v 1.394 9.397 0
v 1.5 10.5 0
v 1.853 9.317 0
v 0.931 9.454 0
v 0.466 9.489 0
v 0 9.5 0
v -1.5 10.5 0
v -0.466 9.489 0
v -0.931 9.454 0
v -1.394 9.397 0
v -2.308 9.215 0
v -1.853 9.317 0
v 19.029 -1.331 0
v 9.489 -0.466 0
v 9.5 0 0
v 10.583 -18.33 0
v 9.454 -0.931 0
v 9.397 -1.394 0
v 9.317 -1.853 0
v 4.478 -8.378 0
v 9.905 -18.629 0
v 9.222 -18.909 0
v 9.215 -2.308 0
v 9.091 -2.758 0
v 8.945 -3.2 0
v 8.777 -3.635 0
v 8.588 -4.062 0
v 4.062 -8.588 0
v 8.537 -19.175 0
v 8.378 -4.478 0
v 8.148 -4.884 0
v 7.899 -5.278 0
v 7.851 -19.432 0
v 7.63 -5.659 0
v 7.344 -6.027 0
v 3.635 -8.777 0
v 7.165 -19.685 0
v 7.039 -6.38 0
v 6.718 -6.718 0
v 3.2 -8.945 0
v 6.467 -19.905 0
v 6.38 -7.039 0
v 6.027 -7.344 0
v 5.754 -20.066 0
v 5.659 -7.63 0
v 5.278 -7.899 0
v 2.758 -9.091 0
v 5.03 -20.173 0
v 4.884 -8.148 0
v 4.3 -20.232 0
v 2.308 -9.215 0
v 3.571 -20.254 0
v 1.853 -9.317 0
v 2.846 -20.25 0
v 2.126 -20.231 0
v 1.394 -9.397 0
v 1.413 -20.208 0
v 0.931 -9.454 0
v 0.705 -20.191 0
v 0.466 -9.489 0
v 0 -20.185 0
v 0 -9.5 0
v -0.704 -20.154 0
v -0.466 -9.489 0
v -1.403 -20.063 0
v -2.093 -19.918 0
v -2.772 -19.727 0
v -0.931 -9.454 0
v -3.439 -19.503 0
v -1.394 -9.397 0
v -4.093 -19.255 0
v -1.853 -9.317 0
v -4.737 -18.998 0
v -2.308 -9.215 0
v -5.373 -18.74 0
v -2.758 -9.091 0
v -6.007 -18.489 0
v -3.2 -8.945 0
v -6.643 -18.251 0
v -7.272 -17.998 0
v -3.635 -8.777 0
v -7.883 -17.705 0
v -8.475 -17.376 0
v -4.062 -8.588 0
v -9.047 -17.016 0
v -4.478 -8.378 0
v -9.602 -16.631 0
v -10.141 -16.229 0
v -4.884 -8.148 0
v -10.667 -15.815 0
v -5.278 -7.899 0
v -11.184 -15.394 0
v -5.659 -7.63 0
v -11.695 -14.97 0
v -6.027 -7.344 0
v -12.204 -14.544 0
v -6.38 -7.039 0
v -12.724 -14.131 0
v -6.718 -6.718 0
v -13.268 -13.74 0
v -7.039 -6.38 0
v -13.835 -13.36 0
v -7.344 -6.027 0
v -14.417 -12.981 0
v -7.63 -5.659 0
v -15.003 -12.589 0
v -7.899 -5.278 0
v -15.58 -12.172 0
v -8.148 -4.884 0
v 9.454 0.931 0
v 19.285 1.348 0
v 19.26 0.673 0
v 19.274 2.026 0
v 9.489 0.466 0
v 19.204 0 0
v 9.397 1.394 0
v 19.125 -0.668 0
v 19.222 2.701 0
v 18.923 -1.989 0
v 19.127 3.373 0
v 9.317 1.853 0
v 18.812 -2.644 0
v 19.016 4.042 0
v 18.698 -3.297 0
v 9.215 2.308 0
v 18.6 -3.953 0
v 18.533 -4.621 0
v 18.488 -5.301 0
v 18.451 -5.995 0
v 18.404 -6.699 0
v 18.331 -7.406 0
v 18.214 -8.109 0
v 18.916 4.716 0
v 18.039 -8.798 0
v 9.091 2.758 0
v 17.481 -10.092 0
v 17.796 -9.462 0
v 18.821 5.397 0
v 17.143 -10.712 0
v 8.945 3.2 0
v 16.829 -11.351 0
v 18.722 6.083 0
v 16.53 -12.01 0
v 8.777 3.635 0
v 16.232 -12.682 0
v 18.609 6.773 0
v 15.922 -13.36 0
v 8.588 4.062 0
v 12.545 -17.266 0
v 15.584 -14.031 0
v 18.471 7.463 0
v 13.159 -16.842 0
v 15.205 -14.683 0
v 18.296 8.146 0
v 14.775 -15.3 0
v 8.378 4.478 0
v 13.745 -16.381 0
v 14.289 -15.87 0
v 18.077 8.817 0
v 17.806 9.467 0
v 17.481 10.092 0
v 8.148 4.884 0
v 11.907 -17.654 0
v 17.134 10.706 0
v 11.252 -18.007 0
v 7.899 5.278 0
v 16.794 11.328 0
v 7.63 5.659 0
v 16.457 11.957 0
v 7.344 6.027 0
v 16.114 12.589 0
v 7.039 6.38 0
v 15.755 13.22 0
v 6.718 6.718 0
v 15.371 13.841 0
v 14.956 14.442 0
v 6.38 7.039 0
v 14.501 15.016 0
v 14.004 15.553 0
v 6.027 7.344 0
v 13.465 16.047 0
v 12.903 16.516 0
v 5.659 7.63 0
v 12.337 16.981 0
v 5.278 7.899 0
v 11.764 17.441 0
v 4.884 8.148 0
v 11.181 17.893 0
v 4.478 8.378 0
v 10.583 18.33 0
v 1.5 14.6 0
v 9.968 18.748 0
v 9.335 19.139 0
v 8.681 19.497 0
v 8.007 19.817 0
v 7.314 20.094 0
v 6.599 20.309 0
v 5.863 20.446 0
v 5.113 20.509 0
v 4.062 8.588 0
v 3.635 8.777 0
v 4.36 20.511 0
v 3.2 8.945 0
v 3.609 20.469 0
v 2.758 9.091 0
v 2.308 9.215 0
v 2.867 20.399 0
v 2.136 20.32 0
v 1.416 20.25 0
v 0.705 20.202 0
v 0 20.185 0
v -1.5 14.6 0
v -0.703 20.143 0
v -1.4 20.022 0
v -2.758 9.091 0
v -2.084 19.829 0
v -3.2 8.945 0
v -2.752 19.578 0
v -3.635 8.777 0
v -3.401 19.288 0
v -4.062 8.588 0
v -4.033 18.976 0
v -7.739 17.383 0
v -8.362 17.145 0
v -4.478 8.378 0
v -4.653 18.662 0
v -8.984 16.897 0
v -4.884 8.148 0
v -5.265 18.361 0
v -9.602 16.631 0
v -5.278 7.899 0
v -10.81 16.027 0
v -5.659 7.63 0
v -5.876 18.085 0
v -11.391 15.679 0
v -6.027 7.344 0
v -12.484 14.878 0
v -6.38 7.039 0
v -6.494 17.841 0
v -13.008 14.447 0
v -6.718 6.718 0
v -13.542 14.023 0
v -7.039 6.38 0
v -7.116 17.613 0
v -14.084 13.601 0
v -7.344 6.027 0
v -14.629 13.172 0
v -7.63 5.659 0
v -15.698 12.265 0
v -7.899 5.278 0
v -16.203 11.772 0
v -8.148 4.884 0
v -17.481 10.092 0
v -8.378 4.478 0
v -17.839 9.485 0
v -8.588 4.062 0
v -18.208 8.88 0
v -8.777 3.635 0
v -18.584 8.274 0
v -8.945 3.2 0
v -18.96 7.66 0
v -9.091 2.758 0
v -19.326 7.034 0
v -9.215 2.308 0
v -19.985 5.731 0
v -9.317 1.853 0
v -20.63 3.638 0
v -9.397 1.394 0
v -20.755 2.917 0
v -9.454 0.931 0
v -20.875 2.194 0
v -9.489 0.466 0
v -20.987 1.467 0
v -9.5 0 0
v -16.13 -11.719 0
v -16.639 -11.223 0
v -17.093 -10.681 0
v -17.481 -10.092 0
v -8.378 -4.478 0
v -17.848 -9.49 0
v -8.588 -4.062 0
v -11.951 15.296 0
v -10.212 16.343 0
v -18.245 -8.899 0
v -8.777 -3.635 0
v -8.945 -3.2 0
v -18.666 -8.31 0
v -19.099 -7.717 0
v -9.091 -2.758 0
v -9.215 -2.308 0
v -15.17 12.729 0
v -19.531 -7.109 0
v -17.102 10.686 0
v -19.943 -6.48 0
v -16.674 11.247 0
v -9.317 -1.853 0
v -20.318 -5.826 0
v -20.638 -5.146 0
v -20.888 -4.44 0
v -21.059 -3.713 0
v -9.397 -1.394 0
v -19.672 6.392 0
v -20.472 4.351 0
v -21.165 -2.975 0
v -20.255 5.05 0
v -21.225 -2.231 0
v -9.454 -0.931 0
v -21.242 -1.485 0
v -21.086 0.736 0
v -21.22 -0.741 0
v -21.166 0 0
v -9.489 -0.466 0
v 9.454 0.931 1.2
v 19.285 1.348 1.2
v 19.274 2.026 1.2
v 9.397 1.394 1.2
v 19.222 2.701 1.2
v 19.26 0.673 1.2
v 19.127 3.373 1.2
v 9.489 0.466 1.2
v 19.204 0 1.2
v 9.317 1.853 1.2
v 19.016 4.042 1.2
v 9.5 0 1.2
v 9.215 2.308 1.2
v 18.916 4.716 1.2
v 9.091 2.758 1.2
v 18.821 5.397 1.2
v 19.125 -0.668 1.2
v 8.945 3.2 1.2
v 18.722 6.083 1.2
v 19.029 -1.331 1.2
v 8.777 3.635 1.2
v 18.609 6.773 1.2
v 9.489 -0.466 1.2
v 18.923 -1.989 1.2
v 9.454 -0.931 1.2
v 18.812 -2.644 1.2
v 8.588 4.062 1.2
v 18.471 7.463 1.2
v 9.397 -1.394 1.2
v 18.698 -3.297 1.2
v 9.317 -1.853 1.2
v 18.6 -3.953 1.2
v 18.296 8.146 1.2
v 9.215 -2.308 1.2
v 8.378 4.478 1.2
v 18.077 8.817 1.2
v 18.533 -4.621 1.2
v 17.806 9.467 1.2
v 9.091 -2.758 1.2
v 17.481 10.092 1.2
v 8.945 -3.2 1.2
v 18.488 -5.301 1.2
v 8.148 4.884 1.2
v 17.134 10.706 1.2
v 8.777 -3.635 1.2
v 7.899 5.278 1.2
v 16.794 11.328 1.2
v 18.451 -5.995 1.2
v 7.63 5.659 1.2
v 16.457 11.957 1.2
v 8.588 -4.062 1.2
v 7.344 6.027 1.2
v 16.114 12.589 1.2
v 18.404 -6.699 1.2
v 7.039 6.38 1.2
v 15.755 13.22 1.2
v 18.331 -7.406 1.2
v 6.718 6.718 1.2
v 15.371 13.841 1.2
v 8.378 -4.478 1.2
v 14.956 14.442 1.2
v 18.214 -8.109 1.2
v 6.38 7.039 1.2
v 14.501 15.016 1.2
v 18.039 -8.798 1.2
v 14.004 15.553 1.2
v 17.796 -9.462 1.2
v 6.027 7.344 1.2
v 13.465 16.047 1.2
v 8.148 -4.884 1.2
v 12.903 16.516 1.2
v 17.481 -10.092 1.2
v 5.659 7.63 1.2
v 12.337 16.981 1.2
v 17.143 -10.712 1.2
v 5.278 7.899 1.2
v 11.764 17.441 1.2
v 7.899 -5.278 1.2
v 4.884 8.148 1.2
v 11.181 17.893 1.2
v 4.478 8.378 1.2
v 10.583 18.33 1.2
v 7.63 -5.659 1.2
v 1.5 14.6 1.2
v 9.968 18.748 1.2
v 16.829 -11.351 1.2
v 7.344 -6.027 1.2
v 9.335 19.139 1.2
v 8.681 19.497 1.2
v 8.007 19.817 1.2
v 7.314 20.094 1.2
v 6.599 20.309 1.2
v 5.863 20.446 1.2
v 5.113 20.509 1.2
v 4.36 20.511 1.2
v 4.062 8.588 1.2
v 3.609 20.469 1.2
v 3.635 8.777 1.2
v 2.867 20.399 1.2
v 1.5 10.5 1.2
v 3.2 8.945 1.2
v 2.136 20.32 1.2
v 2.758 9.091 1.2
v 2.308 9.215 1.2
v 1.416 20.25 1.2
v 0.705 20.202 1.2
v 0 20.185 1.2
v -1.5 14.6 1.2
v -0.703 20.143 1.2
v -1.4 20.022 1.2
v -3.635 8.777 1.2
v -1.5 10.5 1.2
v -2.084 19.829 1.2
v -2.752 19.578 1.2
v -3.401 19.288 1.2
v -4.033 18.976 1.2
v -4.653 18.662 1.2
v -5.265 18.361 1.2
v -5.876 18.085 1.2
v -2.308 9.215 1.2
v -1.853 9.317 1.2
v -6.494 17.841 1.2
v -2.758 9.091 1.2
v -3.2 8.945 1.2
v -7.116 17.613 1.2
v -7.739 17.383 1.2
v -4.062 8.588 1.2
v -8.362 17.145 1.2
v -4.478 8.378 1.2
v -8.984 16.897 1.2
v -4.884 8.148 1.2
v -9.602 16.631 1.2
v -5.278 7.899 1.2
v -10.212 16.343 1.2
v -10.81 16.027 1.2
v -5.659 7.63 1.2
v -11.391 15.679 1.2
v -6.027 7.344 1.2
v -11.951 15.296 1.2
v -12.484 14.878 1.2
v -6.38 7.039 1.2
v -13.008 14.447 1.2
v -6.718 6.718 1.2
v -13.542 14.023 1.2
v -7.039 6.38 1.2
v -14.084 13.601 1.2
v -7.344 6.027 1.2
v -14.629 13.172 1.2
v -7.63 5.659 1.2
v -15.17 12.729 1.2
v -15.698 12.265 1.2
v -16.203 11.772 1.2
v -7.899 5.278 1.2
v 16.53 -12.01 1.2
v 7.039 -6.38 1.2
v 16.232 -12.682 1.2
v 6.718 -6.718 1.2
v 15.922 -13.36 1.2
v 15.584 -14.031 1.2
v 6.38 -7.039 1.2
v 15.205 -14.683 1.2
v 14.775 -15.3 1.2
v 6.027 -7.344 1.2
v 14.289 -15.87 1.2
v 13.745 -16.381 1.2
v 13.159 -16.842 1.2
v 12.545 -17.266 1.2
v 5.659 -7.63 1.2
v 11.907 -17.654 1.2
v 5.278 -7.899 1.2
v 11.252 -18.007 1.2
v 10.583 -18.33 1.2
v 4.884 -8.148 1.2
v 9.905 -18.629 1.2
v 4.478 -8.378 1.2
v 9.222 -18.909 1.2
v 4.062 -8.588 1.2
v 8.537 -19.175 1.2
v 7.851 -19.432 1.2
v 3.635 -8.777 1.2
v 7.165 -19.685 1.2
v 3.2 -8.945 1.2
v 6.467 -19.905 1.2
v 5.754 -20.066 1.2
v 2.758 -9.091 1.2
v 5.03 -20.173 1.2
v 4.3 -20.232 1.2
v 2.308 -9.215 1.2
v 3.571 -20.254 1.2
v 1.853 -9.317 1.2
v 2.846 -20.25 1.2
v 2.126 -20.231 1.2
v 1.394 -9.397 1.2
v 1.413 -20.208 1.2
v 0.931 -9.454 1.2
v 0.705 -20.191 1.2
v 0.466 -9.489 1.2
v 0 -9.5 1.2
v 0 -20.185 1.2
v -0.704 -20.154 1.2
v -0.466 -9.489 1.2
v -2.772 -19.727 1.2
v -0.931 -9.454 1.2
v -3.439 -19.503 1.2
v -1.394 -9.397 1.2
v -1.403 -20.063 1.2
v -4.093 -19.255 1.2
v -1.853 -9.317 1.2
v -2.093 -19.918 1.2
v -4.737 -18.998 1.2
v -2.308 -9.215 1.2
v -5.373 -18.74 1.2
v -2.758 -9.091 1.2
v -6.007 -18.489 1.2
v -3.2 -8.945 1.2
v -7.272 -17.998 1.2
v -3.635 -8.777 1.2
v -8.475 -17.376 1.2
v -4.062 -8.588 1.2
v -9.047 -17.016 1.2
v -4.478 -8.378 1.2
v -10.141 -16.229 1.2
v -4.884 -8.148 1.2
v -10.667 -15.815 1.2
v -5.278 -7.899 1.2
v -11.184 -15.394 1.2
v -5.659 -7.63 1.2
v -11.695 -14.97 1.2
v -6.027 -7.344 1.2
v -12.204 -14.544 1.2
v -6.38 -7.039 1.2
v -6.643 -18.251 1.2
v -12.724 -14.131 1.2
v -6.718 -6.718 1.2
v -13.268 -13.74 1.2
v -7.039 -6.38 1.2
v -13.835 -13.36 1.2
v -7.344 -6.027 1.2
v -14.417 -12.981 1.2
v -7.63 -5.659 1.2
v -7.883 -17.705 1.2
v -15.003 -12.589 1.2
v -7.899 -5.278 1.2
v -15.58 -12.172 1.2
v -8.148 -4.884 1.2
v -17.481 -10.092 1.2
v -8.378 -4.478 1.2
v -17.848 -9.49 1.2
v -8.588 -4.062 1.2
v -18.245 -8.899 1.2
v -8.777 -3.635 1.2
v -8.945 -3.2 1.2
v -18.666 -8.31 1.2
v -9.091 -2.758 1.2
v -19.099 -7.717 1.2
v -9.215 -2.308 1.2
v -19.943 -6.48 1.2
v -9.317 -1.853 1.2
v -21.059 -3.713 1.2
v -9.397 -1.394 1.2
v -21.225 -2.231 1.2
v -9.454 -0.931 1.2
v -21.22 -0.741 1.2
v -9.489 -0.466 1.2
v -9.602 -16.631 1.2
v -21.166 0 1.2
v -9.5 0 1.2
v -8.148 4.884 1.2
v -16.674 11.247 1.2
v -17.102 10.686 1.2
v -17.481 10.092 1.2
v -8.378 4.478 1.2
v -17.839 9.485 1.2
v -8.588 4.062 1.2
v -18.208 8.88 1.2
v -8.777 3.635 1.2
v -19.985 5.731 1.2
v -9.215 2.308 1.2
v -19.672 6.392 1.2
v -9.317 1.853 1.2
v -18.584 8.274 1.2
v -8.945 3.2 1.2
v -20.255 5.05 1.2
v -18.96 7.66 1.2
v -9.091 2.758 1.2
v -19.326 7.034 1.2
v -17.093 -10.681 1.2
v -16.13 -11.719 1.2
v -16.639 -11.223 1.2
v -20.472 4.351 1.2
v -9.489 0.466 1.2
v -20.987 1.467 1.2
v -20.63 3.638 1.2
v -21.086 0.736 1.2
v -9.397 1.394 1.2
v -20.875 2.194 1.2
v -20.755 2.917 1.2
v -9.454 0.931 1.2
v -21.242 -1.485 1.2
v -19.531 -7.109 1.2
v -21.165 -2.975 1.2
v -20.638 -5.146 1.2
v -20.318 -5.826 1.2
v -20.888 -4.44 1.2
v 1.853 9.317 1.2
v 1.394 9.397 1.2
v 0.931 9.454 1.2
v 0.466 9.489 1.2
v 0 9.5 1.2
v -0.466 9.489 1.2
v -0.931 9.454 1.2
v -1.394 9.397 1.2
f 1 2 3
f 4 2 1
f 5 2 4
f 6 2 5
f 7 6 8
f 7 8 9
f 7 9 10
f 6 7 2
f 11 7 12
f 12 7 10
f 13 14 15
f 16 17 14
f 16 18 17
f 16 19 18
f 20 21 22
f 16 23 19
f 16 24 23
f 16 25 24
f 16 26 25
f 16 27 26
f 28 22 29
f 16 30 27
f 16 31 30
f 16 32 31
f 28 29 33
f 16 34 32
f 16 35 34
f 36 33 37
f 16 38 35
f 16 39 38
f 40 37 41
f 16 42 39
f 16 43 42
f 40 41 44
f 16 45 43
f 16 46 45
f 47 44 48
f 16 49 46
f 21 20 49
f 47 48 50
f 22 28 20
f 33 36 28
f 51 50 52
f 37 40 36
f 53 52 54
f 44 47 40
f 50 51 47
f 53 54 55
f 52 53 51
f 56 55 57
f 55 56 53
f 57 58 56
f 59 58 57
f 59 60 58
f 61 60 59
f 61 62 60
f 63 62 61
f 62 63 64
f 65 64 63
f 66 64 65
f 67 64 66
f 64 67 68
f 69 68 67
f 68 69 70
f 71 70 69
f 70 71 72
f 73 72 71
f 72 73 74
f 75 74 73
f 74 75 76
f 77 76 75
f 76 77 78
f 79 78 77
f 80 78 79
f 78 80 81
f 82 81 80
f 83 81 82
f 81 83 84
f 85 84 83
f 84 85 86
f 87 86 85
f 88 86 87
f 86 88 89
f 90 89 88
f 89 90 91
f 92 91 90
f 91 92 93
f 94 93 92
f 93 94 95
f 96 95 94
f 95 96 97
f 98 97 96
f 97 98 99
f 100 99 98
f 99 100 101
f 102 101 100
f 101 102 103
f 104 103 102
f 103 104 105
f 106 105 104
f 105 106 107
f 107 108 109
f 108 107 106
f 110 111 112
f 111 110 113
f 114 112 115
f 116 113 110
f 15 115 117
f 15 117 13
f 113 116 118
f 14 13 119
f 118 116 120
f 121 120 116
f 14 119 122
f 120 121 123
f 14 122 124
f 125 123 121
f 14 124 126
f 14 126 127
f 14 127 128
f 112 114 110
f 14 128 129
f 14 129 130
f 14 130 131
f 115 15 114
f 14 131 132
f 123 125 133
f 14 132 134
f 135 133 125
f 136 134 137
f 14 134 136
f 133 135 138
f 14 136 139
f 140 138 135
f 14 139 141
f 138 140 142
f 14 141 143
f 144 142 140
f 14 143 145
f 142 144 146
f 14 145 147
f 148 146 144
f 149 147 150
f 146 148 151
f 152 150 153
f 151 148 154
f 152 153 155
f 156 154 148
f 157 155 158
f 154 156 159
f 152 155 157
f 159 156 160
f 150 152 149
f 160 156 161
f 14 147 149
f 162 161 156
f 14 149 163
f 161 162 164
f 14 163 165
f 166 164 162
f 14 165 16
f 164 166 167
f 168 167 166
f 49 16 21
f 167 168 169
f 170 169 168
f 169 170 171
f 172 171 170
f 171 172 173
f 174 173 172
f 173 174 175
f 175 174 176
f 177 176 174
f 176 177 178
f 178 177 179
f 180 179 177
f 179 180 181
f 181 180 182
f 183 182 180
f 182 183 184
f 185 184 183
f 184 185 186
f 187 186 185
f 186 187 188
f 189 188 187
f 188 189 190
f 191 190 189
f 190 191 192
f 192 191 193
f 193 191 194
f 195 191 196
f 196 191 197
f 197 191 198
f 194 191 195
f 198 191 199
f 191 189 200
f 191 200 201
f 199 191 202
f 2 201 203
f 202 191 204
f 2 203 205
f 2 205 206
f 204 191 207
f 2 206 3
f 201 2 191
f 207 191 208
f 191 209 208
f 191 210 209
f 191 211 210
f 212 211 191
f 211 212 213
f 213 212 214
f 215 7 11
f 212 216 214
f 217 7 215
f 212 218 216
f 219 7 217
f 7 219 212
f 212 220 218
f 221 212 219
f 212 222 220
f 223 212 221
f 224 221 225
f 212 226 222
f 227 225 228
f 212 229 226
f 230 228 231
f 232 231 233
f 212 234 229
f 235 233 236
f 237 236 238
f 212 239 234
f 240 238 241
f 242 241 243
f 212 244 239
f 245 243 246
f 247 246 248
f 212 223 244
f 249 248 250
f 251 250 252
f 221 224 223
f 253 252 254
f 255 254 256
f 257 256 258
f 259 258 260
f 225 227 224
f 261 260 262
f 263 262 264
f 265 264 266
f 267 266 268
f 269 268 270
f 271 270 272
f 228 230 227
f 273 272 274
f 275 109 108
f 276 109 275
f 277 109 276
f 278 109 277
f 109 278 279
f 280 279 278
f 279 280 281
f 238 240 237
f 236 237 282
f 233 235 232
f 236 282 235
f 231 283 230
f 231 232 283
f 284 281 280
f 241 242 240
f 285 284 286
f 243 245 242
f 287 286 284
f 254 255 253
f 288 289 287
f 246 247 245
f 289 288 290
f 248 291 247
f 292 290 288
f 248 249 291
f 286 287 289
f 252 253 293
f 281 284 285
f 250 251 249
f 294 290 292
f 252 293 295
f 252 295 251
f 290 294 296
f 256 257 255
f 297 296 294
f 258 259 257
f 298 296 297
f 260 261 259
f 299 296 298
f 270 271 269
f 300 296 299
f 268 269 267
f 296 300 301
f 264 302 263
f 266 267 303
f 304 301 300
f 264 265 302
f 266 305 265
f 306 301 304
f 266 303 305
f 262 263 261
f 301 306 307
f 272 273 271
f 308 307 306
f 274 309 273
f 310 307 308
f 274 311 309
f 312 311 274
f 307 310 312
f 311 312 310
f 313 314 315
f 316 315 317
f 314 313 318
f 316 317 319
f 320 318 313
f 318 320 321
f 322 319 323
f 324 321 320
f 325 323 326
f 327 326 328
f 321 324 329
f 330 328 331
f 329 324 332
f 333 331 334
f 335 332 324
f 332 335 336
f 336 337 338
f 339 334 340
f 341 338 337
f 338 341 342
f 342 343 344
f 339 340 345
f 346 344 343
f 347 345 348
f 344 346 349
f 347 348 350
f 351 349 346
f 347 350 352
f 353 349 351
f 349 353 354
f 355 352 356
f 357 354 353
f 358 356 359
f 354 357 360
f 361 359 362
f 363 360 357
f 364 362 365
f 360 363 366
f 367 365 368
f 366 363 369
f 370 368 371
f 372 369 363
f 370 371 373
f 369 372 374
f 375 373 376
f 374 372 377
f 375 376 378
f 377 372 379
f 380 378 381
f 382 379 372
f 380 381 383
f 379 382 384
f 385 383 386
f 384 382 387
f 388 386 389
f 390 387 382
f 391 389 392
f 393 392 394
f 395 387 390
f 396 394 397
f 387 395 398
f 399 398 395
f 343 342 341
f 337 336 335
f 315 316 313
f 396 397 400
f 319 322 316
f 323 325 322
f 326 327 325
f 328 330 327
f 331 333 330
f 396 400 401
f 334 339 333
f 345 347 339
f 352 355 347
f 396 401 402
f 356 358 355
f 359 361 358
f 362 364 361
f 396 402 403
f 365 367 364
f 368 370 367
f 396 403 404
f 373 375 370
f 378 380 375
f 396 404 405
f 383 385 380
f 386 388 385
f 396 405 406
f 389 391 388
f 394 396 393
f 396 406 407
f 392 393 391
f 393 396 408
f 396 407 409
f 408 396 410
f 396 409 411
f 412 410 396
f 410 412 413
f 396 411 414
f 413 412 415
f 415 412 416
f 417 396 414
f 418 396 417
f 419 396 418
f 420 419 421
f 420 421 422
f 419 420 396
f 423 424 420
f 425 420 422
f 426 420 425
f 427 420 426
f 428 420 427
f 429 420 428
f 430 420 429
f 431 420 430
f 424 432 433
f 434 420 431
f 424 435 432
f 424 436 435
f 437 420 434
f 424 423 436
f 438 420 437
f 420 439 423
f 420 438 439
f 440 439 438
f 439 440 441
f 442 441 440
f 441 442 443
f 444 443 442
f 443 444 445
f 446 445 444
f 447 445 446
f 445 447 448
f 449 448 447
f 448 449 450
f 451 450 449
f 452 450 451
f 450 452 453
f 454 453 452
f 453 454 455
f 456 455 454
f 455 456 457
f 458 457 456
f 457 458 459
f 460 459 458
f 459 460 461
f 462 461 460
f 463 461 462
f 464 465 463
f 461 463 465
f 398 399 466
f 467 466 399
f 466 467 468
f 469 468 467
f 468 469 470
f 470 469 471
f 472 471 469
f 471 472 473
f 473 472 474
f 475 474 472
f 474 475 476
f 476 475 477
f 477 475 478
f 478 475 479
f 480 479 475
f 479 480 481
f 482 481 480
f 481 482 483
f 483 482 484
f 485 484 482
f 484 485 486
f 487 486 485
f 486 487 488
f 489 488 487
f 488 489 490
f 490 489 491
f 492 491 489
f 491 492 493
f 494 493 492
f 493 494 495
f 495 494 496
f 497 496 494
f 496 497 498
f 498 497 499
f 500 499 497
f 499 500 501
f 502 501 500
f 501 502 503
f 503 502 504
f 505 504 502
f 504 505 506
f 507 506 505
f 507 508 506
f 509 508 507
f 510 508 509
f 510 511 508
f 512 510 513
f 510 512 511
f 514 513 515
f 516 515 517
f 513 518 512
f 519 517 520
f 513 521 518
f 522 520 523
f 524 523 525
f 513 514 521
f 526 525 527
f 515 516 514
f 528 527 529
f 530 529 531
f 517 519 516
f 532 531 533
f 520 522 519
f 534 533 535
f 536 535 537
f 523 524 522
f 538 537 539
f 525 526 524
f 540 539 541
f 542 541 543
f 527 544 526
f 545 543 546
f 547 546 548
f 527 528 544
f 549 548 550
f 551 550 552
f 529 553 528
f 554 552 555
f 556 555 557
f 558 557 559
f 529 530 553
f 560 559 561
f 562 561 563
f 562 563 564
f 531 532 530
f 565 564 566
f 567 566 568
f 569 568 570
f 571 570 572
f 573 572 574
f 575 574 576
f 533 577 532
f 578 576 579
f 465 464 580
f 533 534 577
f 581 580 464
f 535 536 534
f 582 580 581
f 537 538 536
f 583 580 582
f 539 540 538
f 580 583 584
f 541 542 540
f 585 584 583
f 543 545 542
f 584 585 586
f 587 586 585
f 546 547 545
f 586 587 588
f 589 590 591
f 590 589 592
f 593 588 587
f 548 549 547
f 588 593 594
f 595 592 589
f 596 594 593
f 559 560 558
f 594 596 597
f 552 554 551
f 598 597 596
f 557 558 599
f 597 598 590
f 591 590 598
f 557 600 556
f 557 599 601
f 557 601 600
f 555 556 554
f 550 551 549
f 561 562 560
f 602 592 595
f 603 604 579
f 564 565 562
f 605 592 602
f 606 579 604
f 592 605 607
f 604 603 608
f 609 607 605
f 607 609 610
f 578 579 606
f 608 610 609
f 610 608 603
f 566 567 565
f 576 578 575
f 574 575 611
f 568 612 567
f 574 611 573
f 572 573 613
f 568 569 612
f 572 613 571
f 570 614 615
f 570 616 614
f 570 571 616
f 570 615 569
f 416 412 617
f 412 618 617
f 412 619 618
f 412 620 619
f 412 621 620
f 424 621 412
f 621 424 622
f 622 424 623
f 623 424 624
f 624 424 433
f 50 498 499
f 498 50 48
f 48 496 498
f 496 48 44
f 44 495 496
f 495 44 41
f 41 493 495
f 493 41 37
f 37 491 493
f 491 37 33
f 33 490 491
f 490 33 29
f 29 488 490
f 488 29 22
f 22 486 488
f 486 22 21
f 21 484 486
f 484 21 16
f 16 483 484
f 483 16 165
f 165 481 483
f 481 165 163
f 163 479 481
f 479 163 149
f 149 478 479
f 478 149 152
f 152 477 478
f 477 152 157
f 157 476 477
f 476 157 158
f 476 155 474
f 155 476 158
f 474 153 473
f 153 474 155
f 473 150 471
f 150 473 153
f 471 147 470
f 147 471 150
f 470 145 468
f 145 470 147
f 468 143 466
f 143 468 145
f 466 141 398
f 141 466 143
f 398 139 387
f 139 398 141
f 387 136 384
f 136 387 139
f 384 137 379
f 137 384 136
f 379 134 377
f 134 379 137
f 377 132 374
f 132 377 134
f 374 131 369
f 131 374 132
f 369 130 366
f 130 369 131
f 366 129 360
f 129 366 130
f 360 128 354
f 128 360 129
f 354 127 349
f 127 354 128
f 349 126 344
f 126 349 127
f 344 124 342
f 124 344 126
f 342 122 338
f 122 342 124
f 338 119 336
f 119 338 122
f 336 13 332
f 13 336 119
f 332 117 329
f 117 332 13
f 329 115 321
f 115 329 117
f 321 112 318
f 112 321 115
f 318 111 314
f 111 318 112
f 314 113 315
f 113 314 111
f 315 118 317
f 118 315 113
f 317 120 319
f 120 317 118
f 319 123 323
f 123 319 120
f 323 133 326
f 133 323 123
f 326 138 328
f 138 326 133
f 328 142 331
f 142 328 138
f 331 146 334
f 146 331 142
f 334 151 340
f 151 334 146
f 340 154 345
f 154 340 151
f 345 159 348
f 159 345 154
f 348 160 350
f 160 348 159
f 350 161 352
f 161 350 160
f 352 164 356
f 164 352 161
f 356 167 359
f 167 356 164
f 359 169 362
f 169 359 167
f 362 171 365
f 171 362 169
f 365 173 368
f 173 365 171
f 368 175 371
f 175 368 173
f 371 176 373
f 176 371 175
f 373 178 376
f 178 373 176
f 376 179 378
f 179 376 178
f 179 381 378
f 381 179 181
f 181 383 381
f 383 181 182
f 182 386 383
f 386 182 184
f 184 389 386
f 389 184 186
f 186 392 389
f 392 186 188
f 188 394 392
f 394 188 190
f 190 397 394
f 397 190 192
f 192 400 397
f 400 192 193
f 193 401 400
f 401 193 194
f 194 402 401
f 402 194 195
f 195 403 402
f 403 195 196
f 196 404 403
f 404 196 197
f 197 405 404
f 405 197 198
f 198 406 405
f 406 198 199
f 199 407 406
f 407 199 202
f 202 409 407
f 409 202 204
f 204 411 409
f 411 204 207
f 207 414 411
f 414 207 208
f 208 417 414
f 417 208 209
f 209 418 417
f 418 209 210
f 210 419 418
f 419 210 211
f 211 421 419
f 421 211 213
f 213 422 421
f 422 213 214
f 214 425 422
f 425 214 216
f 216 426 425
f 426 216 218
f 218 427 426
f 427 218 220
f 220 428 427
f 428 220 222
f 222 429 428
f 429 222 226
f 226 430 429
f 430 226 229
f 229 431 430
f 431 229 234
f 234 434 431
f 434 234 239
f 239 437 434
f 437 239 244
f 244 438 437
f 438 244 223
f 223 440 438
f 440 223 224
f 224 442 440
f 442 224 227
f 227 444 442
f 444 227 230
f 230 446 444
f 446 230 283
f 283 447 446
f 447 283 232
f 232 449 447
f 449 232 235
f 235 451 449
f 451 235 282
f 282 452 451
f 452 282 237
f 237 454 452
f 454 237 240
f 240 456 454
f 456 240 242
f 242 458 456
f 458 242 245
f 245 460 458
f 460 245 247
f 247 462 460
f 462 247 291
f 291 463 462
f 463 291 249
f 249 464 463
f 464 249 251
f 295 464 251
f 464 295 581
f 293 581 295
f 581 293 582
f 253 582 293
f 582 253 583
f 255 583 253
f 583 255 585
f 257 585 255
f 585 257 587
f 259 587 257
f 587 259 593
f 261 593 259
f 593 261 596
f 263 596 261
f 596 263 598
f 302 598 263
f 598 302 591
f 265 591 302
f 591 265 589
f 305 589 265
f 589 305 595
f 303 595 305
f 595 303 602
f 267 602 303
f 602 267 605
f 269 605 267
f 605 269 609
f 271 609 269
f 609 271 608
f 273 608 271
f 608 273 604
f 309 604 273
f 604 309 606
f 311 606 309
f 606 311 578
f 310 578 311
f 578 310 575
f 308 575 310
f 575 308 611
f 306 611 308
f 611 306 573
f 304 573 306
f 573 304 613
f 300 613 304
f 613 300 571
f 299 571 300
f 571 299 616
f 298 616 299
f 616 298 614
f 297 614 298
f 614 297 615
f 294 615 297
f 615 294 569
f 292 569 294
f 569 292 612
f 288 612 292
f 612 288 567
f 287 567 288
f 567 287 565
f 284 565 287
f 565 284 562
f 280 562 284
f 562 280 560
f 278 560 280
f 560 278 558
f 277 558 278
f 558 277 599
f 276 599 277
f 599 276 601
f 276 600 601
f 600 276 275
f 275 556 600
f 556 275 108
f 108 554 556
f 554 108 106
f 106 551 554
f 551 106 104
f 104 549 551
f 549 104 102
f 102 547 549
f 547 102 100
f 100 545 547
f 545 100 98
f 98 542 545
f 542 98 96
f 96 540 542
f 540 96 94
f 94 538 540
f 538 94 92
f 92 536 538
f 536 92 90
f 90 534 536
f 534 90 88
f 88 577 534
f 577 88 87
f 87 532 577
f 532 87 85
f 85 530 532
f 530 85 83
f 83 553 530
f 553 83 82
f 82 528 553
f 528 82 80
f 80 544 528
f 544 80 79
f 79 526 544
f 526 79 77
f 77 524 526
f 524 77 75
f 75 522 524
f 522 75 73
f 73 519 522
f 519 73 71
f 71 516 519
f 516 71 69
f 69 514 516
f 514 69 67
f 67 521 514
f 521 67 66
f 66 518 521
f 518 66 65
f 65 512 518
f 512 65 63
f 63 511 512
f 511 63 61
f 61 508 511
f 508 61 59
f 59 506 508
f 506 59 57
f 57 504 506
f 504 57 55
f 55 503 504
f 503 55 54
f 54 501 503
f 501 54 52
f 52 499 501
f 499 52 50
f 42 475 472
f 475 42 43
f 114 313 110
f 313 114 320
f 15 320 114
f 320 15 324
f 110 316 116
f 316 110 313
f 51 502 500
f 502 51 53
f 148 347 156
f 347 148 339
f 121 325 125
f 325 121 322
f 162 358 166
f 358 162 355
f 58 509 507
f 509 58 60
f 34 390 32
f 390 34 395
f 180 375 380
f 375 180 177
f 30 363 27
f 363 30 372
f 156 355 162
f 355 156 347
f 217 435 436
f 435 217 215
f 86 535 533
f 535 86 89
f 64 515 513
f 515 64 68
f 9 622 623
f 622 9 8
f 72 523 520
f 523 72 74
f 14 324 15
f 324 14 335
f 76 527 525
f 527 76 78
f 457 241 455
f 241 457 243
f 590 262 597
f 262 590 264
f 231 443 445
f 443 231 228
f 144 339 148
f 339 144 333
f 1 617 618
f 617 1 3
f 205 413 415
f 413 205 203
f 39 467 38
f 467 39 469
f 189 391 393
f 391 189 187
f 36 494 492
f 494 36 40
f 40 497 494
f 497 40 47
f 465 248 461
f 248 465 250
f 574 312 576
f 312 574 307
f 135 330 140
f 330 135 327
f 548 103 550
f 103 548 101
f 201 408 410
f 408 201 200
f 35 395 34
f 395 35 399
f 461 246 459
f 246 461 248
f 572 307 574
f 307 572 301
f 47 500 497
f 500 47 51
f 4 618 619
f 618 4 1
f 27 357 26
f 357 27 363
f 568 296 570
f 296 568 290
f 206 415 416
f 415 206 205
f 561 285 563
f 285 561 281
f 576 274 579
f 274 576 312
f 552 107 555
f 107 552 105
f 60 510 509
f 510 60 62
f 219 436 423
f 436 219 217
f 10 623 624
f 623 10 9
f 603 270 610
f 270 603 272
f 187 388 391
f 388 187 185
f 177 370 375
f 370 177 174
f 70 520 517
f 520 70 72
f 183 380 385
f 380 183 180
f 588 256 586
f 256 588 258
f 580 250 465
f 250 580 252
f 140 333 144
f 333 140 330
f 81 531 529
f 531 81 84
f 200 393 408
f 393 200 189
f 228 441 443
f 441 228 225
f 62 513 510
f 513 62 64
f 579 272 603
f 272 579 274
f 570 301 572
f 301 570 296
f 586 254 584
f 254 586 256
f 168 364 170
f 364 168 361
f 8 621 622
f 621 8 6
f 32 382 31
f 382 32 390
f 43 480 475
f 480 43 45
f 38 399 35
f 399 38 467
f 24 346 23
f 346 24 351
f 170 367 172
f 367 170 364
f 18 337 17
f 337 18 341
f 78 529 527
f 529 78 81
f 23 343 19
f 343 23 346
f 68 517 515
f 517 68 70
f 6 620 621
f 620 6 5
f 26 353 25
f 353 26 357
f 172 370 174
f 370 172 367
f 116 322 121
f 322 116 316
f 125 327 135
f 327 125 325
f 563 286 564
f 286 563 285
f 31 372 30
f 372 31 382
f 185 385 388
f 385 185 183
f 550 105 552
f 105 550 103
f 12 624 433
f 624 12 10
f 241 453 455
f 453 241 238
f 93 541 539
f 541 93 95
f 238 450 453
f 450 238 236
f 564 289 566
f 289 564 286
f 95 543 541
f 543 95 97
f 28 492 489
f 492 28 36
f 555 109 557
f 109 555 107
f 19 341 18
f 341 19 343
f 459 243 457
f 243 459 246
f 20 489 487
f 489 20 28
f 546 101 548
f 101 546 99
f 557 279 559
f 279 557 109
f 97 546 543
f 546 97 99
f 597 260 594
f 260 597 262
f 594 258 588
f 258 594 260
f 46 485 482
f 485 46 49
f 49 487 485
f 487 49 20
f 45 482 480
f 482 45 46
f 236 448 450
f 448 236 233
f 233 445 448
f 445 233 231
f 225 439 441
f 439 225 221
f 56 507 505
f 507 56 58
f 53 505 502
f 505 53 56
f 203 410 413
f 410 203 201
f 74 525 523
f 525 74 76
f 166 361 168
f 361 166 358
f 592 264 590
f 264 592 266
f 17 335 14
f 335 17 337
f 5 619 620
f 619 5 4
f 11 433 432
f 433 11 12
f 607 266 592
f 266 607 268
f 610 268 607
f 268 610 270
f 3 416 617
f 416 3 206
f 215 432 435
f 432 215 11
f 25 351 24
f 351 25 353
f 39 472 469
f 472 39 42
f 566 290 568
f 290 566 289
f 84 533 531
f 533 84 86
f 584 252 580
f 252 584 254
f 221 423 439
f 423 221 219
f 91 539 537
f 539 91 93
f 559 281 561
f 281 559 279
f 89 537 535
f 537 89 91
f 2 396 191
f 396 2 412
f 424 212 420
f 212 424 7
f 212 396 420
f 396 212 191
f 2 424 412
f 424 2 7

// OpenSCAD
/*
  Elna Supermatic cam 22
  Name: Small lobes
  Status: candidate

  Generated from measured parametric base v2.
  Surface mode: smooth
*/

include <_elna_measured_common.scad>;

profile_points = [
        [0.0000, 20.1850],
        [0.7055, 20.2020],
        [1.4160, 20.2500],
        [2.1357, 20.3202],
        [2.8669, 20.3988],
        [3.6092, 20.4687],
        [4.3599, 20.5115],
        [5.1135, 20.5090],
        [5.8627, 20.4456],
        [6.5990, 20.3095],
        [7.3138, 20.0944],
        [8.0066, 19.8170],
        [8.6807, 19.4972],
        [9.3347, 19.1390],
        [9.9685, 18.7479],
        [10.5830, 18.3303],
        [11.1806, 17.8927],
        [11.7642, 17.4412],
        [12.3374, 16.9810],
        [12.9034, 16.5157],
        [13.4651, 16.0471],
        [14.0045, 15.5535],
        [14.5011, 15.0163],
        [14.9556, 14.4425],
        [15.3715, 13.8406],
        [15.7549, 13.2199],
        [16.1137, 12.5894],
        [16.4572, 11.9569],
        [16.7945, 11.3281],
        [17.1337, 10.7063],
        [17.4807, 10.0925],
        [17.8058, 9.4675],
        [18.0767, 8.8166],
        [18.2963, 8.1460],
        [18.4708, 7.4627],
        [18.6092, 6.7732],
        [18.7221, 6.0832],
        [18.8208, 5.3968],
        [18.9158, 4.7162],
        [19.0158, 4.0419],
        [19.1269, 3.3726],
        [19.2224, 2.7015],
        [19.2742, 2.0258],
        [19.2850, 1.3485],
        [19.2596, 0.6726],
        [19.2040, 0.0000],
        [19.1250, -0.6679],
        [19.0294, -1.3307],
        [18.9234, -1.9889],
        [18.8118, -2.6438],
        [18.6976, -3.2969],
        [18.5998, -3.9535],
        [18.5331, -4.6208],
        [18.4881, -5.3014],
        [18.4507, -5.9950],
        [18.4043, -6.6986],
        [18.3311, -7.4063],
        [18.2142, -8.1095],
        [18.0393, -8.7983],
        [17.7964, -9.4625],
        [17.4807, -10.0925],
        [17.1427, -10.7120],
        [16.8290, -11.3513],
        [16.5299, -12.0097],
        [16.2324, -12.6822],
        [15.9219, -13.3600],
        [15.5836, -14.0315],
        [15.2046, -14.6829],
        [14.7750, -15.3000],
        [14.2891, -15.8696],
        [13.7454, -16.3811],
        [13.1587, -16.8424],
        [12.5447, -17.2663],
        [11.9075, -17.6536],
        [11.2520, -18.0069],
        [10.5830, -18.3303],
        [9.9052, -18.6290],
        [9.2224, -18.9087],
        [8.5373, -19.1750],
        [7.8513, -19.4325],
        [7.1646, -19.6847],
        [6.4675, -19.9050],
        [5.7540, -20.0665],
        [5.0297, -20.1732],
        [4.3005, -20.2324],
        [3.5713, -20.2540],
        [2.8459, -20.2496],
        [2.1263, -20.2308],
        [1.4131, -20.2085],
        [0.7051, -20.1914],
        [0.0000, -20.1850],
        [-0.7038, -20.1540],
        [-1.4030, -20.0631],
        [-2.0935, -19.9180],
        [-2.7725, -19.7275],
        [-3.4388, -19.5026],
        [-4.0929, -19.2554],
        [-4.7367, -18.9977],
        [-5.3735, -18.7397],
        [-6.0075, -18.4892],
        [-6.6427, -18.2507],
        [-7.2716, -17.9979],
        [-7.8827, -17.7048],
        [-8.4747, -17.3756],
        [-9.0474, -17.0156],
        [-9.6020, -16.6312],
        [-10.1409, -16.2288],
        [-10.6671, -15.8146],
        [-11.1842, -15.3937],
        [-11.6955, -14.9696],
        [-12.2040, -14.5441],
        [-12.7237, -14.1312],
        [-13.2683, -13.7397],
        [-13.8352, -13.3604],
        [-14.4172, -12.9813],
        [-15.0034, -12.5893],
        [-15.5796, -12.1721],
        [-16.1301, -11.7192],
        [-16.6392, -11.2233],
        [-17.0930, -10.6809],
        [-17.4807, -10.0925],
        [-17.8482, -9.4901],
        [-18.2451, -8.8987],
        [-18.6657, -8.3105],
        [-19.0993, -7.7166],
        [-19.5310, -7.1087],
        [-19.9434, -6.4800],
        [-20.3181, -5.8261],
        [-20.6377, -5.1456],
        [-20.8880, -4.4399],
        [-21.0591, -3.7133],
        [-21.1653, -2.9746],
        [-21.2254, -2.2309],
        [-21.2423, -1.4854],
        [-21.2204, -0.7410],
        [-21.1660, -0.0000],
        [-21.0858, 0.7363],
        [-20.9866, 1.4675],
        [-20.8747, 2.1940],
        [-20.7547, 2.9169],
        [-20.6298, 3.6376],
        [-20.4720, 4.3515],
        [-20.2551, 5.0502],
        [-19.9853, 5.7307],
        [-19.6720, 6.3918],
        [-19.3262, 7.0342],
        [-18.9596, 7.6602],
        [-18.5836, 8.2739],
        [-18.2076, 8.8805],
        [-17.8388, 9.4850],
        [-17.4807, 10.0925],
        [-17.1020, 10.6865],
        [-16.6737, 11.2466],
        [-16.2028, 11.7720],
        [-15.6983, 12.2648],
        [-15.1704, 12.7294],
        [-14.6293, 13.1722],
        [-14.0841, 13.6009],
        [-13.5423, 14.0234],
        [-13.0083, 14.4472],
        [-12.4842, 14.8781],
        [-11.9508, 15.2963],
        [-11.3915, 15.6790],
        [-10.8104, 16.0271],
        [-10.2123, 16.3430],
        [-9.6020, 16.6312],
        [-8.9841, 16.8966],
        [-8.3623, 17.1453],
        [-7.7392, 17.3826],
        [-7.1163, 17.6134],
        [-6.4936, 17.8410],
        [-5.8761, 18.0847],
        [-5.2648, 18.3606],
        [-4.6529, 18.6618],
        [-4.0335, 18.9763],
        [-3.4010, 19.2880],
        [-2.7516, 19.5783],
        [-2.0841, 19.8287],
        [-1.4000, 20.0216],
        [-0.7034, 20.1434]
];

icon_points = [[-1.000,0.200], [-0.880,0.620], [-0.760,0.860], [-0.640,0.620], [-0.520,0.200], [-0.300,0.200], [-0.180,0.620], [-0.060,0.860], [0.060,0.620], [0.180,0.200], [0.400,0.200], [0.520,0.620], [0.640,0.860], [0.760,0.620], [0.880,0.200], [1.000,0.200]];

elna_cam_ring(profile_points=profile_points);
